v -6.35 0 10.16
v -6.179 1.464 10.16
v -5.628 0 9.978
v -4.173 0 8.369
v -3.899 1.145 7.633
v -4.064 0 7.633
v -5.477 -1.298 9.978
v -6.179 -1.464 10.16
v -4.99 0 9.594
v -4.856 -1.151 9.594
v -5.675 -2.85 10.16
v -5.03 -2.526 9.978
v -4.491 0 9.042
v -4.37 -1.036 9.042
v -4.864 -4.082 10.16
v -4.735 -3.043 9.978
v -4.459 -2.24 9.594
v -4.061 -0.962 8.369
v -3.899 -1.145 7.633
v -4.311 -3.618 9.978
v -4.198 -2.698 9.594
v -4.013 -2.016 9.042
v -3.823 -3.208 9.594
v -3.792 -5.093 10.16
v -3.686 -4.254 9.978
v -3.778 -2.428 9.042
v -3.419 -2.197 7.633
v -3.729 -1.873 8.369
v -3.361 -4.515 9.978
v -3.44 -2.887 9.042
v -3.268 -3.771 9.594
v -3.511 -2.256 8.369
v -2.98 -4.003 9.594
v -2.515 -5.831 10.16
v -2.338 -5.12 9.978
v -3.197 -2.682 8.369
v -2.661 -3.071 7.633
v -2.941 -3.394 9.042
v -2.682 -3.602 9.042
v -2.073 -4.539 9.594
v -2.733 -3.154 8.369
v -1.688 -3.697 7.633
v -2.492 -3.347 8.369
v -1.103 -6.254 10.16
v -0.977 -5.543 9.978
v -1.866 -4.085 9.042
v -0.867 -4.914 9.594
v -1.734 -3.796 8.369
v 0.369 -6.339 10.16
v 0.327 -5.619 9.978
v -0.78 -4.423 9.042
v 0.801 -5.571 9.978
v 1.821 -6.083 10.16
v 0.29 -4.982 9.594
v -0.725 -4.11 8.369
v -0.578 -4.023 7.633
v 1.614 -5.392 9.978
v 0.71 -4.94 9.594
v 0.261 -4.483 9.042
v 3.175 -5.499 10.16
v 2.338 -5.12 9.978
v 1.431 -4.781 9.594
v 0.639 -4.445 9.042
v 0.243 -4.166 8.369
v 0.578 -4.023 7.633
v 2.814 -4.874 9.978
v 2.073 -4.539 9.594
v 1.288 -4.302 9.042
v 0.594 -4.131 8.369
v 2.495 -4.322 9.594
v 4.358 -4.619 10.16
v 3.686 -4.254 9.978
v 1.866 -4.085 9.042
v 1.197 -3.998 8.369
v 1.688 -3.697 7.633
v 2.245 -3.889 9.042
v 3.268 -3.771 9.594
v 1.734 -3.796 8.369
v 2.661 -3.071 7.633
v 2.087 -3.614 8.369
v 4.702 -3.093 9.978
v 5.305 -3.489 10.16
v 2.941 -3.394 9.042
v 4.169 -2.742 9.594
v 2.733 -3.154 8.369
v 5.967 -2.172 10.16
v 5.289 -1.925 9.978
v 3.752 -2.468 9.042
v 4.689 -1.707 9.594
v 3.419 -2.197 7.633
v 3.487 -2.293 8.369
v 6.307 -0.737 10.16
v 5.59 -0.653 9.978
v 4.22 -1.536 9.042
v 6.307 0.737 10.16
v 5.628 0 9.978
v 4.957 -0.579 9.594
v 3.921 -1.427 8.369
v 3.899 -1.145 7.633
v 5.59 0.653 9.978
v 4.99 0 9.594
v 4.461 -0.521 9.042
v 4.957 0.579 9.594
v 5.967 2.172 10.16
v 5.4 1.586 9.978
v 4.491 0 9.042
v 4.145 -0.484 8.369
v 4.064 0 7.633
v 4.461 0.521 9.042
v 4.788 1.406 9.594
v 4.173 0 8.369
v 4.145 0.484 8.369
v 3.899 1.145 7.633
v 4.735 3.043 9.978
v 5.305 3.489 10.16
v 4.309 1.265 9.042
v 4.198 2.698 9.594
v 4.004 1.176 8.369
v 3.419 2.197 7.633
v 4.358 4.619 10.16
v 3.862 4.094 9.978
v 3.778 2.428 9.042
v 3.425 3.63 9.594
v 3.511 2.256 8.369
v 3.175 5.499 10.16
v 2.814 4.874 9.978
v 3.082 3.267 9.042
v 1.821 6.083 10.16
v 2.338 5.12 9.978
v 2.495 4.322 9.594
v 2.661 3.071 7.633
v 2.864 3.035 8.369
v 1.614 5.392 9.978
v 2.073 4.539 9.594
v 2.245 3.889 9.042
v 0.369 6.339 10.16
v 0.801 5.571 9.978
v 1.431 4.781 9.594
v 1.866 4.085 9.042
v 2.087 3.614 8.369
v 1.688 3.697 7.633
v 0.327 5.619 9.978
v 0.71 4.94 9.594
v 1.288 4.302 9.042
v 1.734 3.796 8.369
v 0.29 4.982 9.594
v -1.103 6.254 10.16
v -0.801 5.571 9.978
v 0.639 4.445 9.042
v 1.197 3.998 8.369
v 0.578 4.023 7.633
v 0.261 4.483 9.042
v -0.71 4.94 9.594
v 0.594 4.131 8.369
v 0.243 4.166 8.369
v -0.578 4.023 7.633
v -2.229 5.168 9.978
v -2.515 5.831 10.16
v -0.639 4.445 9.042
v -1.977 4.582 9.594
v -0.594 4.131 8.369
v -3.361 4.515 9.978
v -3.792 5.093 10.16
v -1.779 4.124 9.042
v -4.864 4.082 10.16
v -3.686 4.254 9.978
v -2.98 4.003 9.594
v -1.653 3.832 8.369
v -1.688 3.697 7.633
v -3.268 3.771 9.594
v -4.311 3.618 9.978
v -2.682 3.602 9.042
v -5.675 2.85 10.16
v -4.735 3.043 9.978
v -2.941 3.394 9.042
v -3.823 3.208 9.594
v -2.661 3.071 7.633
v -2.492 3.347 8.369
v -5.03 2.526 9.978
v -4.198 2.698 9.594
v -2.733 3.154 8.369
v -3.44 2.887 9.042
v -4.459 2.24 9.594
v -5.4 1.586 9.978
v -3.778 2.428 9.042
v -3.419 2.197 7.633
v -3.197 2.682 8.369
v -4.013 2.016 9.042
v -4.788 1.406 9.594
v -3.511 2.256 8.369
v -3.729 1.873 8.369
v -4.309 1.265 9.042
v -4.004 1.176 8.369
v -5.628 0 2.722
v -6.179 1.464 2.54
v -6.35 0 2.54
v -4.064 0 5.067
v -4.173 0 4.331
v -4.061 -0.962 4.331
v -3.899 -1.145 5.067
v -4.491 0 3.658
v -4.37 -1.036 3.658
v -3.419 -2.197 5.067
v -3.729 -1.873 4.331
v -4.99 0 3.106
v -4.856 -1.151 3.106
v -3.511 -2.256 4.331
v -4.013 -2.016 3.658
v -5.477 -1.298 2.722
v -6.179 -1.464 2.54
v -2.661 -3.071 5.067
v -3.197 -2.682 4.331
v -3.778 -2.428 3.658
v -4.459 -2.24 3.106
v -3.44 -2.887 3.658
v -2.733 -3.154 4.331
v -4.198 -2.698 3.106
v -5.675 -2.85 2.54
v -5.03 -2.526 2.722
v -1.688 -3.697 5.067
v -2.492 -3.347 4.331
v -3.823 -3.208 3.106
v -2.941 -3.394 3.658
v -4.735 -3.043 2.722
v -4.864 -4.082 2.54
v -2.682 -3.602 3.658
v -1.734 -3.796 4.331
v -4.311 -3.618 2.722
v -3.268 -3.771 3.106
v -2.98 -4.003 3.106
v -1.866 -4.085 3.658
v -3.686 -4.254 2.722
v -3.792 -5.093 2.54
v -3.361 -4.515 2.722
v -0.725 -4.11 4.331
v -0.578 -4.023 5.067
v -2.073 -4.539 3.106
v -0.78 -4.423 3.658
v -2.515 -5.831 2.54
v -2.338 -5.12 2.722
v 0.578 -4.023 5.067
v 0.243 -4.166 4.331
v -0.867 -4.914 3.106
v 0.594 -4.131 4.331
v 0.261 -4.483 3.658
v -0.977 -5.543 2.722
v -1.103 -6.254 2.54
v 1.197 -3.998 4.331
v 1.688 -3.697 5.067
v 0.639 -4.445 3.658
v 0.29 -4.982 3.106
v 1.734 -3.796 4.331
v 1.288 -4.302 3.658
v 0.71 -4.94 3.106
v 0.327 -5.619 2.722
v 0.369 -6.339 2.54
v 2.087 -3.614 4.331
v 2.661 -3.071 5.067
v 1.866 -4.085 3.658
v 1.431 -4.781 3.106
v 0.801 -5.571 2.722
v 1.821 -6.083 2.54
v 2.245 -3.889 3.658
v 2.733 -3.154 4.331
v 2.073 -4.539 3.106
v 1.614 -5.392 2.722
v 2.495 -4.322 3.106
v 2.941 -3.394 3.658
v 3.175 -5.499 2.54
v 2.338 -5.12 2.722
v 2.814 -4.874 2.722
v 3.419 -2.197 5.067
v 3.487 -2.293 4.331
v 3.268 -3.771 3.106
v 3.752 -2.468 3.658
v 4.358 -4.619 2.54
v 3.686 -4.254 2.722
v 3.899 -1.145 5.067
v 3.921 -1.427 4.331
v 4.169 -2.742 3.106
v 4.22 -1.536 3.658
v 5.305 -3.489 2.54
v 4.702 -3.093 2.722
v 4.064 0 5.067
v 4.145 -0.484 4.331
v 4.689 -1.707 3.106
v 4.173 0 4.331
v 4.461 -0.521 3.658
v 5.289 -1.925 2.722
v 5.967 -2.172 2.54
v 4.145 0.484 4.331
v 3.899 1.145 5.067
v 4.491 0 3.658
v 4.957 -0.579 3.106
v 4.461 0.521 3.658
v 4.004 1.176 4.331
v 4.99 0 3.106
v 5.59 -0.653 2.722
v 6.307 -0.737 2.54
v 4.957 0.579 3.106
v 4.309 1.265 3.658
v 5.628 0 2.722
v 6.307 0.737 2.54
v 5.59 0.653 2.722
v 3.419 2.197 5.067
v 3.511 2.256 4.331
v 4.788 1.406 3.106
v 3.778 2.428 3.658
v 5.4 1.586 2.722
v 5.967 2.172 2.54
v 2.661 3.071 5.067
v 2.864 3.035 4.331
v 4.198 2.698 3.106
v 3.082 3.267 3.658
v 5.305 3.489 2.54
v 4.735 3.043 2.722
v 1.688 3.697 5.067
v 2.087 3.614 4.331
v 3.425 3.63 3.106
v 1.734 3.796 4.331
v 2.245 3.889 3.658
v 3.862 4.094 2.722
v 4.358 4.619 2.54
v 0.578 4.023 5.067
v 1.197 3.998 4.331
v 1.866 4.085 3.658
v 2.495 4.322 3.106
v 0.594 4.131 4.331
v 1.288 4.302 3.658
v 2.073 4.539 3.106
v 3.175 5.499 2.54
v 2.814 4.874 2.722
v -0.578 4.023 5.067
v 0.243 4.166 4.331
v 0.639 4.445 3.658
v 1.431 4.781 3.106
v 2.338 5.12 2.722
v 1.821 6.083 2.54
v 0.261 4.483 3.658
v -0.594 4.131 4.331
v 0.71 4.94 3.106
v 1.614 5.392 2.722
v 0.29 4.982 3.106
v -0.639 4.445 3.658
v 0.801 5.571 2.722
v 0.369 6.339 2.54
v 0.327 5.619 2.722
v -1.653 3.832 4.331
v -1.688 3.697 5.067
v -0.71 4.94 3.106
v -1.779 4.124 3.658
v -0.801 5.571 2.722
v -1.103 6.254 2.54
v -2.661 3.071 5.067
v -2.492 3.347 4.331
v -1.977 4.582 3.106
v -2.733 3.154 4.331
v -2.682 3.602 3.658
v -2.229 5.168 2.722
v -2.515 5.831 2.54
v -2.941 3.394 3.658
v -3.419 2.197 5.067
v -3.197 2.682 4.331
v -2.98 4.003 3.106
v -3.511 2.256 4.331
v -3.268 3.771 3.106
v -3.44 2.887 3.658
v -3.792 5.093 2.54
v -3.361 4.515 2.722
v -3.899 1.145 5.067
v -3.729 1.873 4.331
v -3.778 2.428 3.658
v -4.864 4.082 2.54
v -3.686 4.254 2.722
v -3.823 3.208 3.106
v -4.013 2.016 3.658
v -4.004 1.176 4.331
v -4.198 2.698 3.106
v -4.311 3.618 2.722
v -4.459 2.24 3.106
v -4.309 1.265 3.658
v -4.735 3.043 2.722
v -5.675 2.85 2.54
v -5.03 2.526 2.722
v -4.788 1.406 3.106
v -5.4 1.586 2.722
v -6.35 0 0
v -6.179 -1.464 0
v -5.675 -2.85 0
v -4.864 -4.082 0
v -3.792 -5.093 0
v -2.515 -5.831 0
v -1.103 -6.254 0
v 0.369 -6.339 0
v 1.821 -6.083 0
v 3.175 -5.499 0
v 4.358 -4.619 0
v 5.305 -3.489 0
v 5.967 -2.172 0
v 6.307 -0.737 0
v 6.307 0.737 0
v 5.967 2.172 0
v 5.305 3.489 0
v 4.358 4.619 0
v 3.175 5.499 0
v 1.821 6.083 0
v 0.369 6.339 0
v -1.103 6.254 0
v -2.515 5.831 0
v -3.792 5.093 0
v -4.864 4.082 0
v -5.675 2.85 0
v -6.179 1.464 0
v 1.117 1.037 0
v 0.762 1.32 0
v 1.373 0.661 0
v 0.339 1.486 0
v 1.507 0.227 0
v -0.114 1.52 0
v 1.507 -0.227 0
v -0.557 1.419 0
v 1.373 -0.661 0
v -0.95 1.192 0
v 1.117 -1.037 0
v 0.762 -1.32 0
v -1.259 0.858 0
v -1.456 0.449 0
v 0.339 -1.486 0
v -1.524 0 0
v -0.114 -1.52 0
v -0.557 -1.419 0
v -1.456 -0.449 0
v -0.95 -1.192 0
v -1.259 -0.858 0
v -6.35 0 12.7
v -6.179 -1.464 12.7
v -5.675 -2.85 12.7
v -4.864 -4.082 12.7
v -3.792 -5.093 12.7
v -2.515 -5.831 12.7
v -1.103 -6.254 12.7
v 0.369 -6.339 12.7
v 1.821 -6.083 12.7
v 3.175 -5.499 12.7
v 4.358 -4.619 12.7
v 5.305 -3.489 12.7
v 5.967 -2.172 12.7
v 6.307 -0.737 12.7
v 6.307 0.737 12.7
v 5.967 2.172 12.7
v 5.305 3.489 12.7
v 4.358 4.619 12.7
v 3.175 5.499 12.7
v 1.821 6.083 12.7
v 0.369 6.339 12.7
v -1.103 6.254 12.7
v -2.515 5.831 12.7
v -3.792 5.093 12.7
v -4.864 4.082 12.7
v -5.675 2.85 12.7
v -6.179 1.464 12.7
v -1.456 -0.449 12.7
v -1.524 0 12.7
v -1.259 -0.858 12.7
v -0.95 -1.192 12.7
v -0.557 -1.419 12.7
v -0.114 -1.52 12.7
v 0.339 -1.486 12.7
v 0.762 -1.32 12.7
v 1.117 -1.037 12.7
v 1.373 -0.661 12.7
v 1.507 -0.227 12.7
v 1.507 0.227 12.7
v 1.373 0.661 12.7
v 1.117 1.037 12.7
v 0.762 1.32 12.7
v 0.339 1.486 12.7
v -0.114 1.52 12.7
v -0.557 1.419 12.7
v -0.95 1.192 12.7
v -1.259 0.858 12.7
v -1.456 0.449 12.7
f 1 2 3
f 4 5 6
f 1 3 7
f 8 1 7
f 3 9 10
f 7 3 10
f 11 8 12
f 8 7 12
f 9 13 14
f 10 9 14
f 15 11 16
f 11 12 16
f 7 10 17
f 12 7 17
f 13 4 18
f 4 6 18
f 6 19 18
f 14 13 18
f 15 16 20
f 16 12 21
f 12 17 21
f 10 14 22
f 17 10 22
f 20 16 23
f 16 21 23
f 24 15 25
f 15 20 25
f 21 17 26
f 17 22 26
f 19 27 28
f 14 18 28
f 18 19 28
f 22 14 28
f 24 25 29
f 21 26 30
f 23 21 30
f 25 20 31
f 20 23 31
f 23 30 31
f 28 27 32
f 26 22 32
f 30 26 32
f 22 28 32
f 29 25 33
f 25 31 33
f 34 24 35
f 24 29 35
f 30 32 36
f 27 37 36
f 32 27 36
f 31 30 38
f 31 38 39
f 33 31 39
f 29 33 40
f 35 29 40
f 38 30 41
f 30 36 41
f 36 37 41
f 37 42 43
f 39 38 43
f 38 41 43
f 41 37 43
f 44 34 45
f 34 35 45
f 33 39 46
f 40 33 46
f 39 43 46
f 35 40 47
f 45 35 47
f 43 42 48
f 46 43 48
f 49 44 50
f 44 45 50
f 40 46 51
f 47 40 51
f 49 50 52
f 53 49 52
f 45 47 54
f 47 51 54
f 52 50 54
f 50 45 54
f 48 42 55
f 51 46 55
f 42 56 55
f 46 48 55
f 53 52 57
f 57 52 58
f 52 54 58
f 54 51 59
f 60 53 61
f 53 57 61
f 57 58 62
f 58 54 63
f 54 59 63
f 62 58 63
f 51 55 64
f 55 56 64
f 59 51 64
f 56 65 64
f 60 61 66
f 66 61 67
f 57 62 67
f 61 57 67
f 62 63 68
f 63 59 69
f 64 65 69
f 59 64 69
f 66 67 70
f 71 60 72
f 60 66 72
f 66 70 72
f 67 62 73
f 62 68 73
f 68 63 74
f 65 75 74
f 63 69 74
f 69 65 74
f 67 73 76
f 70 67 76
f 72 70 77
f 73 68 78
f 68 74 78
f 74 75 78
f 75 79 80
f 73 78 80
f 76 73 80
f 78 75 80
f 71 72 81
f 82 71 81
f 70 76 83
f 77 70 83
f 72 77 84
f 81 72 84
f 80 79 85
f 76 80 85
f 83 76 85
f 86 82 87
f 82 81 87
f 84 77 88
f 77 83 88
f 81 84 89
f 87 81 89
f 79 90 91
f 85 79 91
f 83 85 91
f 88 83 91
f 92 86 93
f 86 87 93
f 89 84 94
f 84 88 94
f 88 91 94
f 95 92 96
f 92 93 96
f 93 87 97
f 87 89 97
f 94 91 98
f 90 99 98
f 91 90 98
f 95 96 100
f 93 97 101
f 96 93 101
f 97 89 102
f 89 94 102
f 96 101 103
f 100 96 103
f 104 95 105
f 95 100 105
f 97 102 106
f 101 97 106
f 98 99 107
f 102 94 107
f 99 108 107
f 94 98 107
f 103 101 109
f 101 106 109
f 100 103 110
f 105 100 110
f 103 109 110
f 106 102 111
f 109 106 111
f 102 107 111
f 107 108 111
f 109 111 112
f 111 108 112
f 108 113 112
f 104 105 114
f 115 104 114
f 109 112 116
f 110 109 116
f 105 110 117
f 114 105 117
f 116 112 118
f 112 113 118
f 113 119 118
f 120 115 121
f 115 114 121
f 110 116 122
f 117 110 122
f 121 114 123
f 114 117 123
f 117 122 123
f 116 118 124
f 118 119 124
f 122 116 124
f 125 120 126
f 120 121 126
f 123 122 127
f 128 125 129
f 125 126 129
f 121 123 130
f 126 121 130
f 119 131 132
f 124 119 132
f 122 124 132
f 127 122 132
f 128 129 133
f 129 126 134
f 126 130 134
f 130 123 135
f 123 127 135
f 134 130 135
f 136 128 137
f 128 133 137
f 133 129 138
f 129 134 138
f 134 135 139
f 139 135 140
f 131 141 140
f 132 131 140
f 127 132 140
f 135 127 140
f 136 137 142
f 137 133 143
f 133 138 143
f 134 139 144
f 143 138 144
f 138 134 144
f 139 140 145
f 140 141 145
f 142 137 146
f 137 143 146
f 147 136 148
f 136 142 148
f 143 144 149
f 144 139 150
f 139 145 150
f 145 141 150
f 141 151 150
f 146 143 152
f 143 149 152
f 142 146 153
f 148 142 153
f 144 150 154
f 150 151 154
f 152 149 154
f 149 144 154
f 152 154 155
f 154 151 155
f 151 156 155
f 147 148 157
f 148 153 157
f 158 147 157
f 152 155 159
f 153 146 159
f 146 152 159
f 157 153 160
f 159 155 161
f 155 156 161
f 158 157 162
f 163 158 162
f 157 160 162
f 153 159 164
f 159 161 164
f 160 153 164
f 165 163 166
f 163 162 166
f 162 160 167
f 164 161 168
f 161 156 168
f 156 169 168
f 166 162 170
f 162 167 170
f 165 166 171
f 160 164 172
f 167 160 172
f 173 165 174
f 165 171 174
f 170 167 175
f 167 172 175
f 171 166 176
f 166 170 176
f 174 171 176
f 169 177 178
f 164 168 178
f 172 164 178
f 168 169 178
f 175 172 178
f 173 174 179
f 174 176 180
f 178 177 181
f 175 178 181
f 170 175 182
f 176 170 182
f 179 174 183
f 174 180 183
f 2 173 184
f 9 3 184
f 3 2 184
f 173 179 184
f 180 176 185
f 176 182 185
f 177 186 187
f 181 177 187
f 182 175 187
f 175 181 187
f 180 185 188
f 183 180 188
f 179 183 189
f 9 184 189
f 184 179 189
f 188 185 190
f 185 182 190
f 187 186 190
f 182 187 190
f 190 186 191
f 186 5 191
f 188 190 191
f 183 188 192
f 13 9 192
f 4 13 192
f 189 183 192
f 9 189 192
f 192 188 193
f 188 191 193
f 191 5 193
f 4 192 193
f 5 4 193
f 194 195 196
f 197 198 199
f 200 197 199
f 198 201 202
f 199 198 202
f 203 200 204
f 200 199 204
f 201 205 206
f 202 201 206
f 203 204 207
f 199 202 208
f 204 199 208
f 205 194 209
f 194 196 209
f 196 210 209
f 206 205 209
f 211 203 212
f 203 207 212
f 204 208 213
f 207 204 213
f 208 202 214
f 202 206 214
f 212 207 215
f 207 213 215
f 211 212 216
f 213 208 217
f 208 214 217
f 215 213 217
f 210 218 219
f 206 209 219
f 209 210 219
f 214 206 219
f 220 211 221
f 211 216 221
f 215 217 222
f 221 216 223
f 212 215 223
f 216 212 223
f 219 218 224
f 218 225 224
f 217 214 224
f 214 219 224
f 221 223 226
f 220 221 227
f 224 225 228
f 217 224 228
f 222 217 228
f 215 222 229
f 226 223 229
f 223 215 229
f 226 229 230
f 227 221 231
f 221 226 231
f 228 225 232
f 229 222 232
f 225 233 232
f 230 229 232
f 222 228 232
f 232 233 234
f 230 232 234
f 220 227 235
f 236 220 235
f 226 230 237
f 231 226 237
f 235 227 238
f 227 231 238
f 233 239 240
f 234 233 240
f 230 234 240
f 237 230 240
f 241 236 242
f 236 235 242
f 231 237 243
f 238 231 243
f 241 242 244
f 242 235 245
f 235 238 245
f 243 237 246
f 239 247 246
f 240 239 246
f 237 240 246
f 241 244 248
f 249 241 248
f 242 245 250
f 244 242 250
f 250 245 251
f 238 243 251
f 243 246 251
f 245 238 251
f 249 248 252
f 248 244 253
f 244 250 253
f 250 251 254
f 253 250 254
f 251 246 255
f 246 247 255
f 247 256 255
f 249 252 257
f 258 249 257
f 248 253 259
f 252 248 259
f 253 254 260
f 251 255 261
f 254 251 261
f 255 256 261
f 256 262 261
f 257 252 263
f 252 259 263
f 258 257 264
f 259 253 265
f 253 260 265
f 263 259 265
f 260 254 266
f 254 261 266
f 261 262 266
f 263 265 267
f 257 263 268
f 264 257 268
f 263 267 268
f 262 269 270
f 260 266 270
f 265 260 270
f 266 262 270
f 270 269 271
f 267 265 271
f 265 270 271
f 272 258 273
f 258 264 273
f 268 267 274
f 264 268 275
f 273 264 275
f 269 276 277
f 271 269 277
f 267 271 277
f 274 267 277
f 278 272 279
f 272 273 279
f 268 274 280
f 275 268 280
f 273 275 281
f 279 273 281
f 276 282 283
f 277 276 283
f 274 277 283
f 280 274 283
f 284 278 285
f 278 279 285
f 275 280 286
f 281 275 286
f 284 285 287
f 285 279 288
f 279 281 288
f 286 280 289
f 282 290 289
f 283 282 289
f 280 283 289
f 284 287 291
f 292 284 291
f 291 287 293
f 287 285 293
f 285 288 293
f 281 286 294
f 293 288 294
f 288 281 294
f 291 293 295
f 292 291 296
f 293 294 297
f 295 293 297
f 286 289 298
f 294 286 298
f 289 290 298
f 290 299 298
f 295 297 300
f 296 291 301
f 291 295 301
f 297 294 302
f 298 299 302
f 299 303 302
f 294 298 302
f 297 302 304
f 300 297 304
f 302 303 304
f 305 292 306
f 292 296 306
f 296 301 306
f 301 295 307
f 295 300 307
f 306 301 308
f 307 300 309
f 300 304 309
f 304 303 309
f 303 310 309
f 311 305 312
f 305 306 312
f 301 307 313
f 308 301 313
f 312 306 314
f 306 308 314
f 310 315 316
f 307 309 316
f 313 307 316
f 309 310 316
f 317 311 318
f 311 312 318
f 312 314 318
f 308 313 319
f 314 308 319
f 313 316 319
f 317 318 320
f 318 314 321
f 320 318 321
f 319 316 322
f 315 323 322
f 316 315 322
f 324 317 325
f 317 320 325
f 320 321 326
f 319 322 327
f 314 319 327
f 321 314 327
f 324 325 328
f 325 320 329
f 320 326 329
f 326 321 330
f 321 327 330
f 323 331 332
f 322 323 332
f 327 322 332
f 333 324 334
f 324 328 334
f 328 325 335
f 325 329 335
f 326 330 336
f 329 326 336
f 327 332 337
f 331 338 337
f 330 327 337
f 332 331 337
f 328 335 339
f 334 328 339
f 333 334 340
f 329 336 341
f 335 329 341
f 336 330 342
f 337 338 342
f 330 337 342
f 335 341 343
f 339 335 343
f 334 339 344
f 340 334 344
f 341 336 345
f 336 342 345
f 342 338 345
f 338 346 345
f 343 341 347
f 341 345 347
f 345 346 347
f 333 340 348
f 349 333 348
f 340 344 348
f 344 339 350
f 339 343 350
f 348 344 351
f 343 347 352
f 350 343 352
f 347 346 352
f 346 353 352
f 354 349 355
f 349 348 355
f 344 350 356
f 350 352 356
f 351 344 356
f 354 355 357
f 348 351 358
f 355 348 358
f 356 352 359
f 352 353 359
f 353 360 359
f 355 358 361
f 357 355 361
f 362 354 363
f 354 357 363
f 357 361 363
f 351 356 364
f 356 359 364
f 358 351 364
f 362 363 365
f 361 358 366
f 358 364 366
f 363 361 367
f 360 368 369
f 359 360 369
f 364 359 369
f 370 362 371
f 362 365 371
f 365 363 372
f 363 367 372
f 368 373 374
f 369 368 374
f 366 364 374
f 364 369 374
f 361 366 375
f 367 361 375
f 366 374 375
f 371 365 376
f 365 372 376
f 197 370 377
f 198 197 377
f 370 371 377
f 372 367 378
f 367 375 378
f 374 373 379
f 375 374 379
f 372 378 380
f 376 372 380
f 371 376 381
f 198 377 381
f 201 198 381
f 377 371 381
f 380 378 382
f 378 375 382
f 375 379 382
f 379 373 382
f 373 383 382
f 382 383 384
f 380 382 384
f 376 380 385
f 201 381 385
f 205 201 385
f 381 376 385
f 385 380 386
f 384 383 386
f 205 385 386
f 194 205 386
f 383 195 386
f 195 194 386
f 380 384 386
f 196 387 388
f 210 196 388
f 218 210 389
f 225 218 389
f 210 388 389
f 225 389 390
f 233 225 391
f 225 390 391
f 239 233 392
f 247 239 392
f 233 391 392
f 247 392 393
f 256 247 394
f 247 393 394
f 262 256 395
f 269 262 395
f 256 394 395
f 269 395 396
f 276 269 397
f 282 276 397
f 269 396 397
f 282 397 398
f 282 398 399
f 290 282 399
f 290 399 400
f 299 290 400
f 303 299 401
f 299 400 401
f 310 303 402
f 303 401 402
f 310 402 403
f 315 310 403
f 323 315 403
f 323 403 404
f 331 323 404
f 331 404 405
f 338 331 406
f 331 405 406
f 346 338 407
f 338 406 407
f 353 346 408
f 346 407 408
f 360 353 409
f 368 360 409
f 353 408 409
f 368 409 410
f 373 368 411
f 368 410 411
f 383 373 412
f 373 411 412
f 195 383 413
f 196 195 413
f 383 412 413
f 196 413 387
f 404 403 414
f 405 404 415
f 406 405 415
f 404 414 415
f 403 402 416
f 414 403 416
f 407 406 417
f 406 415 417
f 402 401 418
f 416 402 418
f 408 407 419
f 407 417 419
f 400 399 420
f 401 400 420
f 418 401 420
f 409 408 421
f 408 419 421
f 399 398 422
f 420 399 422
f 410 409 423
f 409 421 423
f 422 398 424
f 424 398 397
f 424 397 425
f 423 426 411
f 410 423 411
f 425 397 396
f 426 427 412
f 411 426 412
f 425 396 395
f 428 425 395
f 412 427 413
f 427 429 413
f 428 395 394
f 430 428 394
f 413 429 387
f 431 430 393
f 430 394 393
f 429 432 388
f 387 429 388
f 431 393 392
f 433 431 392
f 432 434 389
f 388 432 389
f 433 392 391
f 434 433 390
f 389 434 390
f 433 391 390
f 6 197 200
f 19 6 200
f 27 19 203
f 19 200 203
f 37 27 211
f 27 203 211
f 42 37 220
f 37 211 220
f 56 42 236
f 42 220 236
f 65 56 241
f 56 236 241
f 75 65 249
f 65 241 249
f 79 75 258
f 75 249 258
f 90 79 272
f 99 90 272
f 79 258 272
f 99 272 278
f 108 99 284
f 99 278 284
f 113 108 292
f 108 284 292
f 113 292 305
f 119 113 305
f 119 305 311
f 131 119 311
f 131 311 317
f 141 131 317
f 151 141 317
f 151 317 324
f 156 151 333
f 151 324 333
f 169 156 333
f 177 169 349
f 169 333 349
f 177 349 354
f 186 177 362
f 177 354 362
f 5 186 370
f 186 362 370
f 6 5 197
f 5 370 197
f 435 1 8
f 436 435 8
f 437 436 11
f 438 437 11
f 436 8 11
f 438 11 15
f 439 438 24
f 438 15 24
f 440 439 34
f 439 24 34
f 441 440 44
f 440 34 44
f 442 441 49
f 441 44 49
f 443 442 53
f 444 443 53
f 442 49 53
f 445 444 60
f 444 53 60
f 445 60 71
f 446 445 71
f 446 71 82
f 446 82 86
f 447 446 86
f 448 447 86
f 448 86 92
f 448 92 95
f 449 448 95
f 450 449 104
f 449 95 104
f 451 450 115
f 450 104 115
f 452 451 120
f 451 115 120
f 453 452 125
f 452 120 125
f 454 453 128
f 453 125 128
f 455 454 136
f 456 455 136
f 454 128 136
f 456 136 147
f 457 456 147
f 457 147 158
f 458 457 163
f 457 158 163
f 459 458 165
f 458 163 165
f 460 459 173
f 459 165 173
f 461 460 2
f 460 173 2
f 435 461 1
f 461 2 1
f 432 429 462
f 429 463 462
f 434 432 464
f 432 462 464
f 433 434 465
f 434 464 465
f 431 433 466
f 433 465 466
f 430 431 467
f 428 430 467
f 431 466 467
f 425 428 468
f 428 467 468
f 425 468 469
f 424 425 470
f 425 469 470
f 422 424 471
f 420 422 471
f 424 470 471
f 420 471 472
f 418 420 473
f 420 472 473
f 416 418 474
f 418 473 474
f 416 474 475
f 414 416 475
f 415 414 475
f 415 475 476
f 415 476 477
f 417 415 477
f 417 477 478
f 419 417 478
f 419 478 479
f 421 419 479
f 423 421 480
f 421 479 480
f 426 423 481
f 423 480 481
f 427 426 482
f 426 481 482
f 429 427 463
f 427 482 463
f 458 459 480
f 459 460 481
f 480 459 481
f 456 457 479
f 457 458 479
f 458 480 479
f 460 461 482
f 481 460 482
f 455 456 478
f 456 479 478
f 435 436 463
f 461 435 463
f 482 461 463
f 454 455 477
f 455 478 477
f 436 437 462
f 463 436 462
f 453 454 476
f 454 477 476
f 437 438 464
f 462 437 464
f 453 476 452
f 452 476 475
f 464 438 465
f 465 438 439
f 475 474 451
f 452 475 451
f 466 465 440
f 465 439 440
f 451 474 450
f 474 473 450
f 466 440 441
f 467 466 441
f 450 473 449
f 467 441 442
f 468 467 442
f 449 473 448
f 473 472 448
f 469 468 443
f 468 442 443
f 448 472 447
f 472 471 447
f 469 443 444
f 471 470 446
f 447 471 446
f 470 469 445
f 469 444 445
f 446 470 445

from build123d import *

# Parameters (mm, degrees)
FILLET1_R = 2.54


with BuildPart() as part:
    # Sketch2 → Revolve1 (revolve)
    with BuildSketch(Plane.YZ, mode=Mode.PRIVATE) as revolve1_sk:
        Polygon((6.35, 0), (1.524, 0), (1.524, 12.7), (6.35, 12.7), (6.35, 10.16), (4.064, 10.16), (4.064, 2.54), (6.35, 2.54), align=None)
    revolve(revolve1_sk.sketch.rotate(Axis((0, 0, 0), (0, 0, 1)), 90), axis=Axis((0, 0, 0), (0, 0, 1)))

    # Fillet1
    # the kernel refuses this fillet: 2.54 mm, written as the material it adds along each edge
    with BuildSketch(Plane(origin=(0, 0, 10.16), x_dir=(-1, 0, 0), z_dir=(0, 1, 0))) as fillet1_piece_1:
        with BuildLine():
            CenterArc((6.604, -2.52726809), FILLET1_R, 95.739170477, 84.260829523)
            Line((4.064, -2.52726809), (4.0132, -2.52726809))
            Line((4.0132, -2.52726809), (4.0132, 0))
            Line((4.0132, 0), (4.064, 0.0508))
            ThreePointArc((4.064, 0.0508), (5.207, 0.0508), (6.34492, 0.050545362))
            Line((6.34492, 0.050545362), (6.35, 0))
        make_face()
    revolve(axis=Axis((0, 0, 10.16), (0, 0, 1)))
    with BuildSketch(Plane(origin=(0, 0, 2.54), x_dir=(-1, 0, 0), z_dir=(0, 1, 0))) as fillet1_piece_2:
        with BuildLine():
            CenterArc((6.604, 2.52726809), FILLET1_R, 180, 84.260829523)
            Line((6.35, 0), (6.34492, -0.050545362))
            ThreePointArc((6.34492, -0.050545362), (5.207, -0.0508), (4.064, -0.0508))
            Line((4.064, -0.0508), (4.0132, 0))
            Line((4.0132, 0), (4.0132, 2.52726809))
            Line((4.0132, 2.52726809), (4.064, 2.52726809))
        make_face()
    revolve(axis=Axis((0, 0, 2.54), (0, 0, 1)))


solid = part.part
